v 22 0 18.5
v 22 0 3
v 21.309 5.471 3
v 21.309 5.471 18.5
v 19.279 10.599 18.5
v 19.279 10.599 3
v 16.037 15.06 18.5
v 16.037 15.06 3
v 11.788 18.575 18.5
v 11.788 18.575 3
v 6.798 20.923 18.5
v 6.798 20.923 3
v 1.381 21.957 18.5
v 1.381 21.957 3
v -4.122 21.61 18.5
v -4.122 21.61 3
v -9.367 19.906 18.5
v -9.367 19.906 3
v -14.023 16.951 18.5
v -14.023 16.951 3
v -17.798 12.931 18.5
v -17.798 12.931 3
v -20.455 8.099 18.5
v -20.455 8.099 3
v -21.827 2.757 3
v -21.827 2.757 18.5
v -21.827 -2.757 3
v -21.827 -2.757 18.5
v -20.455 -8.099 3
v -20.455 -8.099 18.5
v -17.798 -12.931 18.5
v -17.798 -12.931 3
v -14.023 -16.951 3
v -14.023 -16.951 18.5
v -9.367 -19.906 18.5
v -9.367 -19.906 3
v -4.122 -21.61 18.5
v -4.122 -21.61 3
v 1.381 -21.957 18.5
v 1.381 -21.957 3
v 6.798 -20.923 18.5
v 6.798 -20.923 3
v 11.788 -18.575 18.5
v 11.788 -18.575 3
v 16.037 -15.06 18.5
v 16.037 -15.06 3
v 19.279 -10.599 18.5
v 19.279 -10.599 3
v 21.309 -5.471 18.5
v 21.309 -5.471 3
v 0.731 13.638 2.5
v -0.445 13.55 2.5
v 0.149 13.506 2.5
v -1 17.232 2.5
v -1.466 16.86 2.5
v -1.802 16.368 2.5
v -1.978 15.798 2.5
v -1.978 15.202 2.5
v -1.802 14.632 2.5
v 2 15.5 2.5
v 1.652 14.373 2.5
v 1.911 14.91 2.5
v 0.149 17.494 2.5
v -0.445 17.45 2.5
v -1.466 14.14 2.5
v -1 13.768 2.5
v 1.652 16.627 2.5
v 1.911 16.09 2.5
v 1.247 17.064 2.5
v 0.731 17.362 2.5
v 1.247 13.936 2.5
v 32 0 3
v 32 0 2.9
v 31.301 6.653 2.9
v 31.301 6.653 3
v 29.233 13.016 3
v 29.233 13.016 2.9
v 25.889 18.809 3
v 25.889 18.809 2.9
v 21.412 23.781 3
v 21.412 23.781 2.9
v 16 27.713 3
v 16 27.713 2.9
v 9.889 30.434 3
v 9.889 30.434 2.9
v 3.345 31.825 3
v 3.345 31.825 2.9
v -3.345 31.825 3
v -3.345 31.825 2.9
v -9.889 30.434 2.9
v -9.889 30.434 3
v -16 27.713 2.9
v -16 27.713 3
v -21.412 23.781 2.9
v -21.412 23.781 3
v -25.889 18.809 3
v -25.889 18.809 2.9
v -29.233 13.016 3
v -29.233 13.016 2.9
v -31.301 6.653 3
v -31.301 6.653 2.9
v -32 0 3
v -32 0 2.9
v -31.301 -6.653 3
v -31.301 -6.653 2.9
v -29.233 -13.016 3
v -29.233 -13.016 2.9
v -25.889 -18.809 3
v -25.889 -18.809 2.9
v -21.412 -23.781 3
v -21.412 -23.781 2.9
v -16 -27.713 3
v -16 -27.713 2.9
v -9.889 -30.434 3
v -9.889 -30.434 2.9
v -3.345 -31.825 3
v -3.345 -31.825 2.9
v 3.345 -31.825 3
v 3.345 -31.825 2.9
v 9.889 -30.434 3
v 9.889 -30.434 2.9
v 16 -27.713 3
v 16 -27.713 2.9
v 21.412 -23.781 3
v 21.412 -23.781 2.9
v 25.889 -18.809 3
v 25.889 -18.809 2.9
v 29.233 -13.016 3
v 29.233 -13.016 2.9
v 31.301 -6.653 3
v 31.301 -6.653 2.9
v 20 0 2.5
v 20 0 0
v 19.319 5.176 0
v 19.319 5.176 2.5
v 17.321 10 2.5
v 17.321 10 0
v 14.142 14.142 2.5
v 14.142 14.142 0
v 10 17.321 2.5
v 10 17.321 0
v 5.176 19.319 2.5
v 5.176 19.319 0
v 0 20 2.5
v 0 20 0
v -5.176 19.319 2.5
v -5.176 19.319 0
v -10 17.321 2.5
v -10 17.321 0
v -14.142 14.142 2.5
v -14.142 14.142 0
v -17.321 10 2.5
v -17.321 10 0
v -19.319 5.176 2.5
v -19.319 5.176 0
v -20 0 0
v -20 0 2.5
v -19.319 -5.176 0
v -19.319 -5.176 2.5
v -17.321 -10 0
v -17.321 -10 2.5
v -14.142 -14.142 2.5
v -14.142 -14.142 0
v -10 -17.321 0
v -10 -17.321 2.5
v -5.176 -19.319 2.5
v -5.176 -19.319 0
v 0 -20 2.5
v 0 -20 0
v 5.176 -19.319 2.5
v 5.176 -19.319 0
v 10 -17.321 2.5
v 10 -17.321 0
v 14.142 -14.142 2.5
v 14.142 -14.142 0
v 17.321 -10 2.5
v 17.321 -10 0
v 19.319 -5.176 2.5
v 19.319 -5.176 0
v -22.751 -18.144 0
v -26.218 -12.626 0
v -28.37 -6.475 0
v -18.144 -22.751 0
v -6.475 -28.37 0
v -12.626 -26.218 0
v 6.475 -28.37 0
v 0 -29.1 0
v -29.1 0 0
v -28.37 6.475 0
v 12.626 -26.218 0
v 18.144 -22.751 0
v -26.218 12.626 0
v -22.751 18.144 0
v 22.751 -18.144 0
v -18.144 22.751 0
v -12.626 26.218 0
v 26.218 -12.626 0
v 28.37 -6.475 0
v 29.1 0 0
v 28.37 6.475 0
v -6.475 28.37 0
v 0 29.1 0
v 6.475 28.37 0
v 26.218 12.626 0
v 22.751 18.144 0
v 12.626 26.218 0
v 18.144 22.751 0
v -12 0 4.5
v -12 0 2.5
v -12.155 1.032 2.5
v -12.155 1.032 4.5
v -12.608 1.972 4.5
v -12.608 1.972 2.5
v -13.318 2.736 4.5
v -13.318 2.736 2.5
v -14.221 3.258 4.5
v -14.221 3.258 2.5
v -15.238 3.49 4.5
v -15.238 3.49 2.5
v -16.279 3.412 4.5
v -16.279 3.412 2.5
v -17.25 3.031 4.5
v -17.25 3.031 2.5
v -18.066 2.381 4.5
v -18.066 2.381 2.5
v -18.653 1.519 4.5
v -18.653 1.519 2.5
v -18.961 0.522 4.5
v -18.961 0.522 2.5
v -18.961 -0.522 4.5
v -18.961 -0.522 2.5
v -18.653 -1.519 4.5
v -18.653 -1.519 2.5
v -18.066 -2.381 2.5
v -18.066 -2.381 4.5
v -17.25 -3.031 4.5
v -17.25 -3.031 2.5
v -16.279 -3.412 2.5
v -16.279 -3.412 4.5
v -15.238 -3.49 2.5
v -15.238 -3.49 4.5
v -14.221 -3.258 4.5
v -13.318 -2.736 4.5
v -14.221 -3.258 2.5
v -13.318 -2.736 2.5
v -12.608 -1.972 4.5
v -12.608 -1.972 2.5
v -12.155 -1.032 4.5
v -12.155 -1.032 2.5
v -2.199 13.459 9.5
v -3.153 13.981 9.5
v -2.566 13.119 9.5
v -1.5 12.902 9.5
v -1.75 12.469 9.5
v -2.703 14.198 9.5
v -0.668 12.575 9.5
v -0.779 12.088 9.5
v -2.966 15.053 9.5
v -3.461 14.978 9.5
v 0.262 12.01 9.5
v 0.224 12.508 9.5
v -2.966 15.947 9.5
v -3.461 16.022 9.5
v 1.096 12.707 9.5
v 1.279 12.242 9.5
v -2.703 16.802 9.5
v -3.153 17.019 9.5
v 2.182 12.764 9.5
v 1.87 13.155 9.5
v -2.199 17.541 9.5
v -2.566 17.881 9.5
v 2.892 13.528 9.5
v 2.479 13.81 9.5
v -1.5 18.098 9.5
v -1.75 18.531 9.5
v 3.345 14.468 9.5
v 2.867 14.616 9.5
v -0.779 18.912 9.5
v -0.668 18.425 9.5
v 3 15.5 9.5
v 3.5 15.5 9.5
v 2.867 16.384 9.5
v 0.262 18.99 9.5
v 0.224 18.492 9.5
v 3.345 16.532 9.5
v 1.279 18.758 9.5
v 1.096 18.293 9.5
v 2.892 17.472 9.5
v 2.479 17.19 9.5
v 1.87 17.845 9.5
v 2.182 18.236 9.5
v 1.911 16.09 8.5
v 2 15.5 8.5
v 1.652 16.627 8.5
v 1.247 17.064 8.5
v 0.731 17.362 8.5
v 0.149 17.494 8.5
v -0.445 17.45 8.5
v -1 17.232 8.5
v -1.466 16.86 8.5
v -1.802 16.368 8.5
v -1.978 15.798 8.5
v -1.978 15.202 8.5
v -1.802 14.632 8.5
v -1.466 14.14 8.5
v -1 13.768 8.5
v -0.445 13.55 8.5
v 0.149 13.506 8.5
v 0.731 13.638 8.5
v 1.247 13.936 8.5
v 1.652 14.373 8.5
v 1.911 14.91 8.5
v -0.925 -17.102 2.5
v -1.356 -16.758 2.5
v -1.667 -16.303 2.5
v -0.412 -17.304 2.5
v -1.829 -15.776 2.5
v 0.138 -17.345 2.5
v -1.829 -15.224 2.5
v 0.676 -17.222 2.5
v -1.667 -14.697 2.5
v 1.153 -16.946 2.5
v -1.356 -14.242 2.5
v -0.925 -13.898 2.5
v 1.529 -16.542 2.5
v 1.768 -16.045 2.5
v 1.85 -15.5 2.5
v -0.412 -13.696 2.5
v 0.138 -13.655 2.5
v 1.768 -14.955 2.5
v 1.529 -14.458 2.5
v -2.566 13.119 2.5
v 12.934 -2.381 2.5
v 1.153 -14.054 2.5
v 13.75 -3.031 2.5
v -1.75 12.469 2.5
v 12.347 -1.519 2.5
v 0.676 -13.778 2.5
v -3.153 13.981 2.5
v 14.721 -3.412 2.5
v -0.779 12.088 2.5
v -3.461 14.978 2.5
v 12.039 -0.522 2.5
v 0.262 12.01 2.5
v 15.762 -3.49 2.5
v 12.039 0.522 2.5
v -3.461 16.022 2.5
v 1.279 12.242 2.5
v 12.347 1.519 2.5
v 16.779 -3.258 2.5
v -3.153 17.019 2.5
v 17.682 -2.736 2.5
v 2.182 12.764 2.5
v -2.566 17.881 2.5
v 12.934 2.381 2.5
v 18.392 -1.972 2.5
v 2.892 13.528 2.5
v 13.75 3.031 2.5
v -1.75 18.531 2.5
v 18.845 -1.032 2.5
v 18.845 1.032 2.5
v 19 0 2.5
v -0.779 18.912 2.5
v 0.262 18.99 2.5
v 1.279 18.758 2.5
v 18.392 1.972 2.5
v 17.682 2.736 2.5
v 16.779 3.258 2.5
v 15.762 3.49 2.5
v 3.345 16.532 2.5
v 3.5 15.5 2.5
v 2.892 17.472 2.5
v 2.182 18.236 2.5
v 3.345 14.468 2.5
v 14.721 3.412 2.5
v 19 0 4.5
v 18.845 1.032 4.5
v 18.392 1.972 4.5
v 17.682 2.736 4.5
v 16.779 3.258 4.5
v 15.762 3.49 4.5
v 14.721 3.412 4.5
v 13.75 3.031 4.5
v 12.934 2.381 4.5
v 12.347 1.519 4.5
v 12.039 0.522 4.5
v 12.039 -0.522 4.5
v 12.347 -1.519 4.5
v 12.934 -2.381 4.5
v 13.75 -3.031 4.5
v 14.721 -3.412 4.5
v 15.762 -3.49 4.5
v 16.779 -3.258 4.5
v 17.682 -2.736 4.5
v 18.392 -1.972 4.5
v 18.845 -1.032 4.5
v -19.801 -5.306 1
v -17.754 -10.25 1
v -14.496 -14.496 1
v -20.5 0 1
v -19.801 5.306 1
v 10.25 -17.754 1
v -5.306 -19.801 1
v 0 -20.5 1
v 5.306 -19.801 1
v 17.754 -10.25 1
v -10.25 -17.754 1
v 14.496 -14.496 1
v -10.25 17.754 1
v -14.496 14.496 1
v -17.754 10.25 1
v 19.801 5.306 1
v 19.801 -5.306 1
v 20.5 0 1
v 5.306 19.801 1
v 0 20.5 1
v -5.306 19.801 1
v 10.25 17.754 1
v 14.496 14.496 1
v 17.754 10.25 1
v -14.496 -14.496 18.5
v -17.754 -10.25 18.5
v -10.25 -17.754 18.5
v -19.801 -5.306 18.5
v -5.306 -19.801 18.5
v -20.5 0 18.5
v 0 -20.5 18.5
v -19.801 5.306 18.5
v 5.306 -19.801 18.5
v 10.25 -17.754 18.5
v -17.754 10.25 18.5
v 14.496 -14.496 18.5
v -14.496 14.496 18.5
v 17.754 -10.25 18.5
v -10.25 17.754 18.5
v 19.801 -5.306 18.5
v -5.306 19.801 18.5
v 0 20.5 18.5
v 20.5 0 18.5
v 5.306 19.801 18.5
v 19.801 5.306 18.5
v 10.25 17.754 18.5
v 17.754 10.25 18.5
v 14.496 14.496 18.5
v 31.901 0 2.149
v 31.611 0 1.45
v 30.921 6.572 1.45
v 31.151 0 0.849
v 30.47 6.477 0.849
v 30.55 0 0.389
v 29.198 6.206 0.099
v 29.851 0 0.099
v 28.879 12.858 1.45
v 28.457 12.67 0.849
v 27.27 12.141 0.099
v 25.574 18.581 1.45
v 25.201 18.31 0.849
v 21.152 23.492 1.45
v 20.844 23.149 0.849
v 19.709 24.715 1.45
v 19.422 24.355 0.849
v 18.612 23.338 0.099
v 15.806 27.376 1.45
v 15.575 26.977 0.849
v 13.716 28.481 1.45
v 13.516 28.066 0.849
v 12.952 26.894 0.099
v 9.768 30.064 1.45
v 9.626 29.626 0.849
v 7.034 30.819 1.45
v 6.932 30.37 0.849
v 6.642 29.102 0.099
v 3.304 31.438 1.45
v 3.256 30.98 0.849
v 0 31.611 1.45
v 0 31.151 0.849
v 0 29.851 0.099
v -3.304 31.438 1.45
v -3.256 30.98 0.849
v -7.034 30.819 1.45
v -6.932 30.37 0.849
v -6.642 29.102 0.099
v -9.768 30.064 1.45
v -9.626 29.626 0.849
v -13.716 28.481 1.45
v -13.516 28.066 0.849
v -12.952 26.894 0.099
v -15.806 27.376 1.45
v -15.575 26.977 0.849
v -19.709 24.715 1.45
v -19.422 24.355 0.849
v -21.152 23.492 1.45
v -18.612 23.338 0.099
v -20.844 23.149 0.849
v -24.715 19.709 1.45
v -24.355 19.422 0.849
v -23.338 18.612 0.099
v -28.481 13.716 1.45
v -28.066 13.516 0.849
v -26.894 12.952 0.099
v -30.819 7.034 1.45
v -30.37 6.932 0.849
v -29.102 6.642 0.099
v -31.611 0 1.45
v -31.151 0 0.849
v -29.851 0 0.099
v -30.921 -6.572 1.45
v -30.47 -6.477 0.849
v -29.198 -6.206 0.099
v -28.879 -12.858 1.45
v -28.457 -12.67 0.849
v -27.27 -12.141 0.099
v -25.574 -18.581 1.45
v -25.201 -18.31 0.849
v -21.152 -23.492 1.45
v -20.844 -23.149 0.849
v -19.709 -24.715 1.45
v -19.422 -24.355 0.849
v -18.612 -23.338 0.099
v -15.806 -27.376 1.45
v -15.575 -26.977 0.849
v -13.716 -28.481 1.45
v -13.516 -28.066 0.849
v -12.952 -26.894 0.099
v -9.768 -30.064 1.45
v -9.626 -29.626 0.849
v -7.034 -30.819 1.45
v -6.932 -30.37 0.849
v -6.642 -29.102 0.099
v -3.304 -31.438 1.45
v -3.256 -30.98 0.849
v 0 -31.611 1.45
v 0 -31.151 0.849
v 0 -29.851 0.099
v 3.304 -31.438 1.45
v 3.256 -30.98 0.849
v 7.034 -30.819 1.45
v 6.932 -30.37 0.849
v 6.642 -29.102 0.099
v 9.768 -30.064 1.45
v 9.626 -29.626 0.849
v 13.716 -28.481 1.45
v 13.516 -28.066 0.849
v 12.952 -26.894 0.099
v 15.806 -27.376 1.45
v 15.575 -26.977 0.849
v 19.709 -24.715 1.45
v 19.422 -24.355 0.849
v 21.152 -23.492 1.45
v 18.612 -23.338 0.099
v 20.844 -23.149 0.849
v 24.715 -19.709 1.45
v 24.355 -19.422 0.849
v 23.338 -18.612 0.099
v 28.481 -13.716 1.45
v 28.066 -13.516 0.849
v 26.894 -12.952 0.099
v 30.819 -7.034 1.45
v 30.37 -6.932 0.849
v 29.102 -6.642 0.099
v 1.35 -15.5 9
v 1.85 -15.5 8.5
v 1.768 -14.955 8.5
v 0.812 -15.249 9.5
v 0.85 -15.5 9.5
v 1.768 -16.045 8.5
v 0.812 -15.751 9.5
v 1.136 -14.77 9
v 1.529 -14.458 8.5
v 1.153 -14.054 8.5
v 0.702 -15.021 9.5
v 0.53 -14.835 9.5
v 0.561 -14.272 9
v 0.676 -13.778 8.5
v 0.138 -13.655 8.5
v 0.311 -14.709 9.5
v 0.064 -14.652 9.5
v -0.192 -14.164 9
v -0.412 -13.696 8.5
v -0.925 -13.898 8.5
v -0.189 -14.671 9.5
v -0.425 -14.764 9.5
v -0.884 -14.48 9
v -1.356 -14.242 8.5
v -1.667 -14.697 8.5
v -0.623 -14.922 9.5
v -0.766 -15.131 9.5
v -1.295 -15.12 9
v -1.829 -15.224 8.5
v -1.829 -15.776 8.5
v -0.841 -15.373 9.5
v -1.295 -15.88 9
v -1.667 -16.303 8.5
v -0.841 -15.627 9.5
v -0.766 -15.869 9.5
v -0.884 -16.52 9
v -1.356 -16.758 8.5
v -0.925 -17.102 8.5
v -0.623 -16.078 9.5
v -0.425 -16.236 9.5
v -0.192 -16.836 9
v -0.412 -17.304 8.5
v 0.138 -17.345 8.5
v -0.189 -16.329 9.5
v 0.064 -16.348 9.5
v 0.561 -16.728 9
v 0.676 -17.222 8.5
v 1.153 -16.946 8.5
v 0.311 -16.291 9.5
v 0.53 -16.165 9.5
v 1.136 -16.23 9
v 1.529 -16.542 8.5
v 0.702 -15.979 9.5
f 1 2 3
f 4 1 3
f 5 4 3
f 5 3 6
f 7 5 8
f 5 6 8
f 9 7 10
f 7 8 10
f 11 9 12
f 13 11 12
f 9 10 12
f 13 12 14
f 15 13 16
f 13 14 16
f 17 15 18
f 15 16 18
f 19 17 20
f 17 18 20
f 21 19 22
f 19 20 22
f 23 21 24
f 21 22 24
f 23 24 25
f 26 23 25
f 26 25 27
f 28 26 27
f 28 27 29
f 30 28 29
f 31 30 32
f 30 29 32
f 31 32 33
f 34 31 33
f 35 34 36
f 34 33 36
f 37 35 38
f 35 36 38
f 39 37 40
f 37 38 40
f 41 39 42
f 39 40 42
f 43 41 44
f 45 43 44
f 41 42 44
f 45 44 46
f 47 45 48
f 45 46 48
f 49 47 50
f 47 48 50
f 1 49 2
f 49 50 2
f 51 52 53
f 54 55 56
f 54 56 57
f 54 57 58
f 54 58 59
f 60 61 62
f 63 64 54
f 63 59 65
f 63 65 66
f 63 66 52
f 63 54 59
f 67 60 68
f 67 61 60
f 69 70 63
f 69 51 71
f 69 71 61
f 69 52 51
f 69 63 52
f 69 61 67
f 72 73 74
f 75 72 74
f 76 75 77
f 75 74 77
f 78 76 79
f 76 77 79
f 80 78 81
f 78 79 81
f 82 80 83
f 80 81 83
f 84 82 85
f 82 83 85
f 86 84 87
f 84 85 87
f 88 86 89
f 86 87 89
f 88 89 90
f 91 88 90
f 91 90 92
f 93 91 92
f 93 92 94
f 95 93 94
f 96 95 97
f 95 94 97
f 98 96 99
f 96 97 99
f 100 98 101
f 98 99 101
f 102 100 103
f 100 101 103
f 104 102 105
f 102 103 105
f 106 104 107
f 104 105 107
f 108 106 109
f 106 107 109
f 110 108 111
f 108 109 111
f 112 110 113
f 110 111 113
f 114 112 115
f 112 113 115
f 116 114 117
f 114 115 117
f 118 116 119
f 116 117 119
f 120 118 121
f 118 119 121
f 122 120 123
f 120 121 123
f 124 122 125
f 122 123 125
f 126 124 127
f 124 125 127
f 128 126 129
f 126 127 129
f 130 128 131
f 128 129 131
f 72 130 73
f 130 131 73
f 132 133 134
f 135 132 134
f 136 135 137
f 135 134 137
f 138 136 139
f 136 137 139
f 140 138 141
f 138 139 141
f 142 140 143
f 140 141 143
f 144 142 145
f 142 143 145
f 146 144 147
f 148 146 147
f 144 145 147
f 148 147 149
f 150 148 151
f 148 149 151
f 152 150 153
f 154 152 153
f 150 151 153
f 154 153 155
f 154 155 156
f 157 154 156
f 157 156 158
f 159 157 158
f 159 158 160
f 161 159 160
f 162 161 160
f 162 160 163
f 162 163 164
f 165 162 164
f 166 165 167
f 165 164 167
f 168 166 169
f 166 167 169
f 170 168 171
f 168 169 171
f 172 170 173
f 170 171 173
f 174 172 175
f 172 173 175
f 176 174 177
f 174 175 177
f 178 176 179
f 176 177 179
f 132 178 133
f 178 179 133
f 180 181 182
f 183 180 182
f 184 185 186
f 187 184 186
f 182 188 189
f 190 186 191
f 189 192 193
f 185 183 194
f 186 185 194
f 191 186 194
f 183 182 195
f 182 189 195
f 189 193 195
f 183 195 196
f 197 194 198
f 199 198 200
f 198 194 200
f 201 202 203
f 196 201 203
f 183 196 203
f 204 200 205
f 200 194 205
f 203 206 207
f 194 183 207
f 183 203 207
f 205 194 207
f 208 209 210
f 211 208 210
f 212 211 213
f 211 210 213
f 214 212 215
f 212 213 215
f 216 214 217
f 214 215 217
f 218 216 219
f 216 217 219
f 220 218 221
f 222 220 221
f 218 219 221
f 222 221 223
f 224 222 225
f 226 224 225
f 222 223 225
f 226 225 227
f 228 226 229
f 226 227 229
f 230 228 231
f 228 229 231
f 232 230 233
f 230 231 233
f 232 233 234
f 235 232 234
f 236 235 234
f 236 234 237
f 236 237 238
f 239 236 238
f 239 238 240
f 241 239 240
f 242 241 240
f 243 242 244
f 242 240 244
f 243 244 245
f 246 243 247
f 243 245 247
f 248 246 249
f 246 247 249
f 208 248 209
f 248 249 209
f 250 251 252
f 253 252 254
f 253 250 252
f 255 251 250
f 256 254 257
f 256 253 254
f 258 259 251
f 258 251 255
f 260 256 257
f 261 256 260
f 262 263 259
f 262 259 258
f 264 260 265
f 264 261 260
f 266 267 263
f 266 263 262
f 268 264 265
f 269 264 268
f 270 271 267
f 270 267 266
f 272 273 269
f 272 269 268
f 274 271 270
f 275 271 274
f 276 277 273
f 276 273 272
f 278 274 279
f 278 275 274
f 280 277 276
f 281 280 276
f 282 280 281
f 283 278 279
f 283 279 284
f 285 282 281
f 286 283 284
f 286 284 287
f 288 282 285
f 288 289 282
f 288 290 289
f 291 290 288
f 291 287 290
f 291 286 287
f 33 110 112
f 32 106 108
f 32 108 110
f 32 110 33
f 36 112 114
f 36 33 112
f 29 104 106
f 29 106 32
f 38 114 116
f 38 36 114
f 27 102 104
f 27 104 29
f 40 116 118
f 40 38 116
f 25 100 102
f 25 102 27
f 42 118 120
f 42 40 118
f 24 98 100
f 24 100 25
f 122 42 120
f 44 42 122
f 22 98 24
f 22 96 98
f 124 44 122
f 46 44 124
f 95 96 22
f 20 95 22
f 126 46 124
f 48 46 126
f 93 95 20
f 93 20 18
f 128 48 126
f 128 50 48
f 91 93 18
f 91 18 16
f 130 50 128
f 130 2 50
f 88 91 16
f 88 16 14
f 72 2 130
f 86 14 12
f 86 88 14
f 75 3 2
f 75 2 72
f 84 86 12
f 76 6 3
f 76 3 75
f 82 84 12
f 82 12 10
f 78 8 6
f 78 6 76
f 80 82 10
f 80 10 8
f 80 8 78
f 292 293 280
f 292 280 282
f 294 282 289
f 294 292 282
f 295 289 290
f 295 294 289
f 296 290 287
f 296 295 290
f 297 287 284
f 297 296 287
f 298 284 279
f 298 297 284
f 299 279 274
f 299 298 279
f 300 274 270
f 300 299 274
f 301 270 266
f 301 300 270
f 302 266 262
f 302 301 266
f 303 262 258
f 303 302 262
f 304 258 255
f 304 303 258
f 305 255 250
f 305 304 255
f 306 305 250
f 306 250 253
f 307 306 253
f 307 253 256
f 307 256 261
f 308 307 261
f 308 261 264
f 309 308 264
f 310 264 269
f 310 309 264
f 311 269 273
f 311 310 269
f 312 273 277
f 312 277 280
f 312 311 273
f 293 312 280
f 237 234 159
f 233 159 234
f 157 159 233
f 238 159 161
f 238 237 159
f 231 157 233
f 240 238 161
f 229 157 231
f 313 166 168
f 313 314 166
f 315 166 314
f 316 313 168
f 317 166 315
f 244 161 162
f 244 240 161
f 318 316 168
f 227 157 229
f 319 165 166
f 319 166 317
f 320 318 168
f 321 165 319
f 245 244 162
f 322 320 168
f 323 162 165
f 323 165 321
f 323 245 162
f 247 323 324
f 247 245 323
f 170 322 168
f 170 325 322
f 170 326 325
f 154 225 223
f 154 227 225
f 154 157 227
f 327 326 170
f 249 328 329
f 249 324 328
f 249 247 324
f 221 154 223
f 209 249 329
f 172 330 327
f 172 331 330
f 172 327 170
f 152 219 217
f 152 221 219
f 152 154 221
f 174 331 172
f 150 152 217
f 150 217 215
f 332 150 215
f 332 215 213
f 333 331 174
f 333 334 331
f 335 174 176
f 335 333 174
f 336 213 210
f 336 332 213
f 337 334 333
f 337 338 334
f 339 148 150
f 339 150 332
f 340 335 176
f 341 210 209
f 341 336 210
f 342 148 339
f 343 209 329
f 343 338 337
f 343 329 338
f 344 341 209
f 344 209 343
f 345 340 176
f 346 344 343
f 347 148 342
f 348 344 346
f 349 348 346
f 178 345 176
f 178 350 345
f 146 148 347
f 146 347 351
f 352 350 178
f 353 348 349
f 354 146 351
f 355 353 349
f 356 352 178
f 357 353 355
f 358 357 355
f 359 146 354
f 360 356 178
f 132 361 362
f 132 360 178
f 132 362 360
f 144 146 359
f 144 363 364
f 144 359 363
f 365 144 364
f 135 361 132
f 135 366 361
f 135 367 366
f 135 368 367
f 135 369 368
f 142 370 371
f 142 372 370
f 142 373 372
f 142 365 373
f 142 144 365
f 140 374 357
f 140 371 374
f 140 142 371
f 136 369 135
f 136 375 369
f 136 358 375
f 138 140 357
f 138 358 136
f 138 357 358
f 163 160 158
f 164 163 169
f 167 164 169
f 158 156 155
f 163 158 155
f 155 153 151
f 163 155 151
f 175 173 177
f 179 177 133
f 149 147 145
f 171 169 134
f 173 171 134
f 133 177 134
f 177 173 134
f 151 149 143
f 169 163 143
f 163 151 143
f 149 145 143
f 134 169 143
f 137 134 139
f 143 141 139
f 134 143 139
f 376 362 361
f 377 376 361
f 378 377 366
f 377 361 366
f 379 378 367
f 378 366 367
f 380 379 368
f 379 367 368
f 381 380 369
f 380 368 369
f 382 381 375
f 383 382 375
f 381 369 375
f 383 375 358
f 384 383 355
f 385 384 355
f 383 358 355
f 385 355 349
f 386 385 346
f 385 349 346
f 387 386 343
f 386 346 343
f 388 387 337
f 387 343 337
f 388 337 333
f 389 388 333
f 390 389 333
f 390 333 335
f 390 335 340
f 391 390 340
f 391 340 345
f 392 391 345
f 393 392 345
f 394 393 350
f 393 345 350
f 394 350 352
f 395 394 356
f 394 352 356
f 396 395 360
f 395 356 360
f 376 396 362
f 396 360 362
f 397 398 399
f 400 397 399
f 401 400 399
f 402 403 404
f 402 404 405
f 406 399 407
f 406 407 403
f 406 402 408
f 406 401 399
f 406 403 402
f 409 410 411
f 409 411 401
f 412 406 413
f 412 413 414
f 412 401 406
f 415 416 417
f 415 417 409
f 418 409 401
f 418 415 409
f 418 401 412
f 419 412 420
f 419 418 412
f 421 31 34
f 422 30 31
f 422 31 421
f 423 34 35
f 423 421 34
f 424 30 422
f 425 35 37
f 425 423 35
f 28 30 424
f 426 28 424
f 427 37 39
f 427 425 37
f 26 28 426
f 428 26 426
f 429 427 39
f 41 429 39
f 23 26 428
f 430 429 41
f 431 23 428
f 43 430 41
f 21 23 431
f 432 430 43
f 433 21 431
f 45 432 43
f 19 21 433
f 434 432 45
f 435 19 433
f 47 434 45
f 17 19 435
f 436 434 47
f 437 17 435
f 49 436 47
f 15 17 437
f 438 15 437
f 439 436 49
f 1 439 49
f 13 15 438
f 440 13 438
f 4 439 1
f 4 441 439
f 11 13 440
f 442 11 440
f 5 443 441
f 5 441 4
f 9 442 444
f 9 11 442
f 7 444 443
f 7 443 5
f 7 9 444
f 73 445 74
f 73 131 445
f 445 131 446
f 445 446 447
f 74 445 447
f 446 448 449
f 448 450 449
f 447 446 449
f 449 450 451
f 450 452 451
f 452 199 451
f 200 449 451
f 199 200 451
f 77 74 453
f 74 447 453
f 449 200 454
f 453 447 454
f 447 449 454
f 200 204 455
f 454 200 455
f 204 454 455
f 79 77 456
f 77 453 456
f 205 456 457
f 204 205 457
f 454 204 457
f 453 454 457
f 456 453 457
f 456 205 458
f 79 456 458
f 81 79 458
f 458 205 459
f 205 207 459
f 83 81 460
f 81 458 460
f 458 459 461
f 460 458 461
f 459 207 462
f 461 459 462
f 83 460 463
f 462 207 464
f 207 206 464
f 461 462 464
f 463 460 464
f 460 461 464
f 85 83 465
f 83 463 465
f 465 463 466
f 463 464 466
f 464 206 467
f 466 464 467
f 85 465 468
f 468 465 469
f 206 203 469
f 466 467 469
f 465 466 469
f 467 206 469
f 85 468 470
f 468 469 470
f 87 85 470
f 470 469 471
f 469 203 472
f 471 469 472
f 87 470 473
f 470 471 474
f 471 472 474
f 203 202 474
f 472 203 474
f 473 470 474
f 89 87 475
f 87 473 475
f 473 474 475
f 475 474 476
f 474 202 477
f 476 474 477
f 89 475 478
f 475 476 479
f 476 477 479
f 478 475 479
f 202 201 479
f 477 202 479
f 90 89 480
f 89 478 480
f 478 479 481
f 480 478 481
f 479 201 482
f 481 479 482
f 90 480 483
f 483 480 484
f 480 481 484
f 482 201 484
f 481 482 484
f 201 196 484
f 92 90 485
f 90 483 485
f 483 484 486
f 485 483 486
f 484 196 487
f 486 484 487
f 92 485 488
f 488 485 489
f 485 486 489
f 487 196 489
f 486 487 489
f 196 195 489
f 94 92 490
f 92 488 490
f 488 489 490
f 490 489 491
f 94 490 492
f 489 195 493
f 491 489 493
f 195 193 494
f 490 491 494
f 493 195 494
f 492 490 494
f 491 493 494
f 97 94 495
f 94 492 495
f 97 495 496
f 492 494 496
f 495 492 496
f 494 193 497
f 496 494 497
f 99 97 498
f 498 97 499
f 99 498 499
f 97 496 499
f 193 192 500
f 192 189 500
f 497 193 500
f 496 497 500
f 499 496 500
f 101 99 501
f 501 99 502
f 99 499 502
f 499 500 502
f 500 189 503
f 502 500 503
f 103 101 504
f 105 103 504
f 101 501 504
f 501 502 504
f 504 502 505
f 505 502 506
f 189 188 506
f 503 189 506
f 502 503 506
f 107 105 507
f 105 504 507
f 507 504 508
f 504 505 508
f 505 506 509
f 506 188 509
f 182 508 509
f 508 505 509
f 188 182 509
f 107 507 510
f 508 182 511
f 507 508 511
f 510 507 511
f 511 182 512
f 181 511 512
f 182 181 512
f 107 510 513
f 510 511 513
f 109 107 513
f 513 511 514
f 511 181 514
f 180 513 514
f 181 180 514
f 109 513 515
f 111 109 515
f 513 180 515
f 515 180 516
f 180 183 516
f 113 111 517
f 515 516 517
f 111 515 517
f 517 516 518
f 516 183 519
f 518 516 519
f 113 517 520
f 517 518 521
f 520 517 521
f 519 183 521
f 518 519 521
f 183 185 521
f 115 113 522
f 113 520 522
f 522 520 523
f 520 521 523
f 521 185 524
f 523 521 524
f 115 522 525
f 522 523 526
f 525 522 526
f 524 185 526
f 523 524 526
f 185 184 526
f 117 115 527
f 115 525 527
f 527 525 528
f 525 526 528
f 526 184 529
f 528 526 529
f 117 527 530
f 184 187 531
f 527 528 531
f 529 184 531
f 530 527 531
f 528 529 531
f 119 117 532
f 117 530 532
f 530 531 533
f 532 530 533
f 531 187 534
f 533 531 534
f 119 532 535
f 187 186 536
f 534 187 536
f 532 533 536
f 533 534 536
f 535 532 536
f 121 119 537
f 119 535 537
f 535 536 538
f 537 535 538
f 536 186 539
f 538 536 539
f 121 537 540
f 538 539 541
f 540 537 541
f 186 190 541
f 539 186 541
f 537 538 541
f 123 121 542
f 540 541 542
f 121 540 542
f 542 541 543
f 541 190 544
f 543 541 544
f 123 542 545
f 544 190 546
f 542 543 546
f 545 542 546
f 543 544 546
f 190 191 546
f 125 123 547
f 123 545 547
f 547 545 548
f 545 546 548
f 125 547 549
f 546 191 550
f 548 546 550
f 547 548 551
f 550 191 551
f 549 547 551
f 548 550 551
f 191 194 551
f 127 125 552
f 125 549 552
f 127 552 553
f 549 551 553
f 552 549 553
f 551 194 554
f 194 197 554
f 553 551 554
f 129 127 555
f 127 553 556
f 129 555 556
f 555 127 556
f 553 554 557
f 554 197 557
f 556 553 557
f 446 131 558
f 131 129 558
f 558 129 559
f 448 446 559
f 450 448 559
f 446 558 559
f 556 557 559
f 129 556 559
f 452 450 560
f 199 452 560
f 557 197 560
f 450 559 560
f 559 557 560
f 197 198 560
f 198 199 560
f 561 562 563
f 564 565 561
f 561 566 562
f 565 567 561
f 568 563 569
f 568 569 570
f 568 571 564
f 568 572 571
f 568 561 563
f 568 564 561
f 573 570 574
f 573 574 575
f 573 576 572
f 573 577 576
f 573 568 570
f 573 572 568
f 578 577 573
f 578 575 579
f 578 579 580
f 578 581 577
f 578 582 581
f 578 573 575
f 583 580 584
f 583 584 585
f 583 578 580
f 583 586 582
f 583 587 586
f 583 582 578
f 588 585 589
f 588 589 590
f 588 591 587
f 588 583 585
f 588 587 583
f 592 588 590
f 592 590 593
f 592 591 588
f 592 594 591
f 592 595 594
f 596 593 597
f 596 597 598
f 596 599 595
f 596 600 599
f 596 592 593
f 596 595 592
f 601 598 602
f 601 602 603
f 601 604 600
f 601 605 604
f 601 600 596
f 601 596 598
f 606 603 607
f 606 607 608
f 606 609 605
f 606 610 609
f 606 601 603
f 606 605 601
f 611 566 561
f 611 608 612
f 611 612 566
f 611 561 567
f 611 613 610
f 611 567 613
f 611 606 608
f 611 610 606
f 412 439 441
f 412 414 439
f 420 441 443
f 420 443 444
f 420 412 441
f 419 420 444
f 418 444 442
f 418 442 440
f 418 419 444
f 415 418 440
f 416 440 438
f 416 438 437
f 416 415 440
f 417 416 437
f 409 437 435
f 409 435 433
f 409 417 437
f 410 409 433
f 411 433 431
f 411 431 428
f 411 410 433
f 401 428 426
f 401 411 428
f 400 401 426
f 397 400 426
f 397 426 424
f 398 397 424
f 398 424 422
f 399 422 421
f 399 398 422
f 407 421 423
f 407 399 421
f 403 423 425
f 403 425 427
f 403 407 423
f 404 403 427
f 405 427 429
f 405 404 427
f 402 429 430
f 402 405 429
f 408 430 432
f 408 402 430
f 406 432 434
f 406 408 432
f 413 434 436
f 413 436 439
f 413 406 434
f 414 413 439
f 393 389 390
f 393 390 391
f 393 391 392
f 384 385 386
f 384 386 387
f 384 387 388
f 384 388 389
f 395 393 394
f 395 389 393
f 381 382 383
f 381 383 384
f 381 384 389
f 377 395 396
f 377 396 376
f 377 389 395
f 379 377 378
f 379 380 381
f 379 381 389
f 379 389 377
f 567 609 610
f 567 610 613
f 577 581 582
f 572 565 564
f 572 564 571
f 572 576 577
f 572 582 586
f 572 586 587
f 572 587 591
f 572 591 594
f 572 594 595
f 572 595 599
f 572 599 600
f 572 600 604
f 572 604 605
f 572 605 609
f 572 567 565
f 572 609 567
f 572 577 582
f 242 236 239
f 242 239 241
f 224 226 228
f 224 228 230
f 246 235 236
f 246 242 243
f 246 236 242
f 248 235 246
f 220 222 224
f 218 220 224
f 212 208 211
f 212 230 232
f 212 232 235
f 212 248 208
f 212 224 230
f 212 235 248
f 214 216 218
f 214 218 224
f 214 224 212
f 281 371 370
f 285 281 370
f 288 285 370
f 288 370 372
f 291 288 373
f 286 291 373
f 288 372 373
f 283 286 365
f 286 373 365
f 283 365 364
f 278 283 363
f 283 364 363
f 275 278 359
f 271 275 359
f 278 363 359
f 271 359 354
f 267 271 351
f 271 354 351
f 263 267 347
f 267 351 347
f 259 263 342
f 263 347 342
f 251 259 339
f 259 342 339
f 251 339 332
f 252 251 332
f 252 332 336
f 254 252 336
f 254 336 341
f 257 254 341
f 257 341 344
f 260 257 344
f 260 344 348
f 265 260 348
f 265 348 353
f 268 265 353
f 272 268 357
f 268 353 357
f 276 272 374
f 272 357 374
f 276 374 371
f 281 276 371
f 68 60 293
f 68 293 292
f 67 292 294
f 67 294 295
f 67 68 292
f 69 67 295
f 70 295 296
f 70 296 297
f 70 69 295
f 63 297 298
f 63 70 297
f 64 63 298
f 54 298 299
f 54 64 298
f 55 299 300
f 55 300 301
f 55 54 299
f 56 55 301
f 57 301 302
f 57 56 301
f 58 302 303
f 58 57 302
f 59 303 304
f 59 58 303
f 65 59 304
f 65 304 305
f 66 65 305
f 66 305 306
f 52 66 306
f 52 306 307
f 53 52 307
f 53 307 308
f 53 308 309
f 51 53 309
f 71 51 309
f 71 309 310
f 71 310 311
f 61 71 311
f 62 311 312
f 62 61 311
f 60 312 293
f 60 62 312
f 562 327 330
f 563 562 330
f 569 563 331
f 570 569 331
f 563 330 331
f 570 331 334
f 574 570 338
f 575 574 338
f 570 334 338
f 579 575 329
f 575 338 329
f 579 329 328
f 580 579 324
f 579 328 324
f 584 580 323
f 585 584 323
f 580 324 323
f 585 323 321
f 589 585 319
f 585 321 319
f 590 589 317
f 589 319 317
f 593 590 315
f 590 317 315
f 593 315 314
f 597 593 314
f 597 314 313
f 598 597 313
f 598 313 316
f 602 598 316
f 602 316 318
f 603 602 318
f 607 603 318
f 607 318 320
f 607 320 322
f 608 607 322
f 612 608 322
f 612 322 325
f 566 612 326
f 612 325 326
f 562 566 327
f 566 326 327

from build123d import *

# Parameters (mm, degrees)
SKETCH_R      = 20
PAD_DEPTH     = 2.5
SKETCH001_R   = 3.5
PAD001_DEPTH  = 2
SKETCH002_R   = 3.5
SKETCH002_R_2 = 2
SKETCH002_R_3 = 1.85
PAD002_DEPTH  = 7
CHAMFER_SIZE  = 1
SKETCH003_R   = 32
PAD003_DEPTH  = 3
SKETCH004_R   = 20.5
POCKET_DEPTH  = 2
FILLET_R      = 2.9
SKETCH005_R   = 22
SKETCH005_R_2 = 20.5
PAD004_DEPTH  = 15.5


with BuildPart() as body:
    # Sketch → Pad (new body)
    with BuildSketch(Plane.XY):
        Circle(SKETCH_R)
    extrude(amount=PAD_DEPTH)

    # Sketch001 (on Face3 of Pad) → Pad001 (join)
    with BuildSketch(Plane.XY.offset(2.5)):
        with Locations((-15.5, 0)):
            Circle(SKETCH001_R)
        with Locations((15.5, 0)):
            Circle(SKETCH001_R)
    extrude(amount=PAD001_DEPTH)

    # Sketch002 (on Face3 of Pad001) → Pad002 (join)
    with BuildSketch(Plane.XY.offset(2.5)):
        with Locations((0, 15.5)):
            Circle(SKETCH002_R)
        with Locations((0, 15.5)):
            Circle(SKETCH002_R_2, mode=Mode.SUBTRACT)
        with Locations((0, -15.5)):
            Circle(SKETCH002_R_3)
    extrude(amount=PAD002_DEPTH)

    # Chamfer
    chamfer_edges = [body.edges().sort_by_distance(p)[0] for p in [
        (-1.85, -15.5, 9.5),
        (-2, 15.5, 9.5),
    ]]
    chamfer(chamfer_edges, length=CHAMFER_SIZE)


with BuildPart() as body001:
    # Sketch003 → Pad003 (new body)
    with BuildSketch(Plane.XY):
        Circle(SKETCH003_R)
    extrude(amount=PAD003_DEPTH)

    # Sketch004 (on Face3 of Pad003) → Pocket (cut)
    with BuildSketch(Plane.XY.offset(3)):
        Circle(SKETCH004_R)
    extrude(amount=-POCKET_DEPTH, mode=Mode.SUBTRACT)

    # Fillet
    fillet_edges = [body001.edges().sort_by_distance(p)[0] for p in [
        (-32, 0, 0),
    ]]
    fillet(fillet_edges, radius=FILLET_R)

    # Sketch005 (on Face3 of Fillet) → Pad004 (join)
    with BuildSketch(Plane.XY.offset(3)):
        Circle(SKETCH005_R)
        Circle(SKETCH005_R_2, mode=Mode.SUBTRACT)
    extrude(amount=PAD004_DEPTH)


solid = Compound([body.part, body001.part])
